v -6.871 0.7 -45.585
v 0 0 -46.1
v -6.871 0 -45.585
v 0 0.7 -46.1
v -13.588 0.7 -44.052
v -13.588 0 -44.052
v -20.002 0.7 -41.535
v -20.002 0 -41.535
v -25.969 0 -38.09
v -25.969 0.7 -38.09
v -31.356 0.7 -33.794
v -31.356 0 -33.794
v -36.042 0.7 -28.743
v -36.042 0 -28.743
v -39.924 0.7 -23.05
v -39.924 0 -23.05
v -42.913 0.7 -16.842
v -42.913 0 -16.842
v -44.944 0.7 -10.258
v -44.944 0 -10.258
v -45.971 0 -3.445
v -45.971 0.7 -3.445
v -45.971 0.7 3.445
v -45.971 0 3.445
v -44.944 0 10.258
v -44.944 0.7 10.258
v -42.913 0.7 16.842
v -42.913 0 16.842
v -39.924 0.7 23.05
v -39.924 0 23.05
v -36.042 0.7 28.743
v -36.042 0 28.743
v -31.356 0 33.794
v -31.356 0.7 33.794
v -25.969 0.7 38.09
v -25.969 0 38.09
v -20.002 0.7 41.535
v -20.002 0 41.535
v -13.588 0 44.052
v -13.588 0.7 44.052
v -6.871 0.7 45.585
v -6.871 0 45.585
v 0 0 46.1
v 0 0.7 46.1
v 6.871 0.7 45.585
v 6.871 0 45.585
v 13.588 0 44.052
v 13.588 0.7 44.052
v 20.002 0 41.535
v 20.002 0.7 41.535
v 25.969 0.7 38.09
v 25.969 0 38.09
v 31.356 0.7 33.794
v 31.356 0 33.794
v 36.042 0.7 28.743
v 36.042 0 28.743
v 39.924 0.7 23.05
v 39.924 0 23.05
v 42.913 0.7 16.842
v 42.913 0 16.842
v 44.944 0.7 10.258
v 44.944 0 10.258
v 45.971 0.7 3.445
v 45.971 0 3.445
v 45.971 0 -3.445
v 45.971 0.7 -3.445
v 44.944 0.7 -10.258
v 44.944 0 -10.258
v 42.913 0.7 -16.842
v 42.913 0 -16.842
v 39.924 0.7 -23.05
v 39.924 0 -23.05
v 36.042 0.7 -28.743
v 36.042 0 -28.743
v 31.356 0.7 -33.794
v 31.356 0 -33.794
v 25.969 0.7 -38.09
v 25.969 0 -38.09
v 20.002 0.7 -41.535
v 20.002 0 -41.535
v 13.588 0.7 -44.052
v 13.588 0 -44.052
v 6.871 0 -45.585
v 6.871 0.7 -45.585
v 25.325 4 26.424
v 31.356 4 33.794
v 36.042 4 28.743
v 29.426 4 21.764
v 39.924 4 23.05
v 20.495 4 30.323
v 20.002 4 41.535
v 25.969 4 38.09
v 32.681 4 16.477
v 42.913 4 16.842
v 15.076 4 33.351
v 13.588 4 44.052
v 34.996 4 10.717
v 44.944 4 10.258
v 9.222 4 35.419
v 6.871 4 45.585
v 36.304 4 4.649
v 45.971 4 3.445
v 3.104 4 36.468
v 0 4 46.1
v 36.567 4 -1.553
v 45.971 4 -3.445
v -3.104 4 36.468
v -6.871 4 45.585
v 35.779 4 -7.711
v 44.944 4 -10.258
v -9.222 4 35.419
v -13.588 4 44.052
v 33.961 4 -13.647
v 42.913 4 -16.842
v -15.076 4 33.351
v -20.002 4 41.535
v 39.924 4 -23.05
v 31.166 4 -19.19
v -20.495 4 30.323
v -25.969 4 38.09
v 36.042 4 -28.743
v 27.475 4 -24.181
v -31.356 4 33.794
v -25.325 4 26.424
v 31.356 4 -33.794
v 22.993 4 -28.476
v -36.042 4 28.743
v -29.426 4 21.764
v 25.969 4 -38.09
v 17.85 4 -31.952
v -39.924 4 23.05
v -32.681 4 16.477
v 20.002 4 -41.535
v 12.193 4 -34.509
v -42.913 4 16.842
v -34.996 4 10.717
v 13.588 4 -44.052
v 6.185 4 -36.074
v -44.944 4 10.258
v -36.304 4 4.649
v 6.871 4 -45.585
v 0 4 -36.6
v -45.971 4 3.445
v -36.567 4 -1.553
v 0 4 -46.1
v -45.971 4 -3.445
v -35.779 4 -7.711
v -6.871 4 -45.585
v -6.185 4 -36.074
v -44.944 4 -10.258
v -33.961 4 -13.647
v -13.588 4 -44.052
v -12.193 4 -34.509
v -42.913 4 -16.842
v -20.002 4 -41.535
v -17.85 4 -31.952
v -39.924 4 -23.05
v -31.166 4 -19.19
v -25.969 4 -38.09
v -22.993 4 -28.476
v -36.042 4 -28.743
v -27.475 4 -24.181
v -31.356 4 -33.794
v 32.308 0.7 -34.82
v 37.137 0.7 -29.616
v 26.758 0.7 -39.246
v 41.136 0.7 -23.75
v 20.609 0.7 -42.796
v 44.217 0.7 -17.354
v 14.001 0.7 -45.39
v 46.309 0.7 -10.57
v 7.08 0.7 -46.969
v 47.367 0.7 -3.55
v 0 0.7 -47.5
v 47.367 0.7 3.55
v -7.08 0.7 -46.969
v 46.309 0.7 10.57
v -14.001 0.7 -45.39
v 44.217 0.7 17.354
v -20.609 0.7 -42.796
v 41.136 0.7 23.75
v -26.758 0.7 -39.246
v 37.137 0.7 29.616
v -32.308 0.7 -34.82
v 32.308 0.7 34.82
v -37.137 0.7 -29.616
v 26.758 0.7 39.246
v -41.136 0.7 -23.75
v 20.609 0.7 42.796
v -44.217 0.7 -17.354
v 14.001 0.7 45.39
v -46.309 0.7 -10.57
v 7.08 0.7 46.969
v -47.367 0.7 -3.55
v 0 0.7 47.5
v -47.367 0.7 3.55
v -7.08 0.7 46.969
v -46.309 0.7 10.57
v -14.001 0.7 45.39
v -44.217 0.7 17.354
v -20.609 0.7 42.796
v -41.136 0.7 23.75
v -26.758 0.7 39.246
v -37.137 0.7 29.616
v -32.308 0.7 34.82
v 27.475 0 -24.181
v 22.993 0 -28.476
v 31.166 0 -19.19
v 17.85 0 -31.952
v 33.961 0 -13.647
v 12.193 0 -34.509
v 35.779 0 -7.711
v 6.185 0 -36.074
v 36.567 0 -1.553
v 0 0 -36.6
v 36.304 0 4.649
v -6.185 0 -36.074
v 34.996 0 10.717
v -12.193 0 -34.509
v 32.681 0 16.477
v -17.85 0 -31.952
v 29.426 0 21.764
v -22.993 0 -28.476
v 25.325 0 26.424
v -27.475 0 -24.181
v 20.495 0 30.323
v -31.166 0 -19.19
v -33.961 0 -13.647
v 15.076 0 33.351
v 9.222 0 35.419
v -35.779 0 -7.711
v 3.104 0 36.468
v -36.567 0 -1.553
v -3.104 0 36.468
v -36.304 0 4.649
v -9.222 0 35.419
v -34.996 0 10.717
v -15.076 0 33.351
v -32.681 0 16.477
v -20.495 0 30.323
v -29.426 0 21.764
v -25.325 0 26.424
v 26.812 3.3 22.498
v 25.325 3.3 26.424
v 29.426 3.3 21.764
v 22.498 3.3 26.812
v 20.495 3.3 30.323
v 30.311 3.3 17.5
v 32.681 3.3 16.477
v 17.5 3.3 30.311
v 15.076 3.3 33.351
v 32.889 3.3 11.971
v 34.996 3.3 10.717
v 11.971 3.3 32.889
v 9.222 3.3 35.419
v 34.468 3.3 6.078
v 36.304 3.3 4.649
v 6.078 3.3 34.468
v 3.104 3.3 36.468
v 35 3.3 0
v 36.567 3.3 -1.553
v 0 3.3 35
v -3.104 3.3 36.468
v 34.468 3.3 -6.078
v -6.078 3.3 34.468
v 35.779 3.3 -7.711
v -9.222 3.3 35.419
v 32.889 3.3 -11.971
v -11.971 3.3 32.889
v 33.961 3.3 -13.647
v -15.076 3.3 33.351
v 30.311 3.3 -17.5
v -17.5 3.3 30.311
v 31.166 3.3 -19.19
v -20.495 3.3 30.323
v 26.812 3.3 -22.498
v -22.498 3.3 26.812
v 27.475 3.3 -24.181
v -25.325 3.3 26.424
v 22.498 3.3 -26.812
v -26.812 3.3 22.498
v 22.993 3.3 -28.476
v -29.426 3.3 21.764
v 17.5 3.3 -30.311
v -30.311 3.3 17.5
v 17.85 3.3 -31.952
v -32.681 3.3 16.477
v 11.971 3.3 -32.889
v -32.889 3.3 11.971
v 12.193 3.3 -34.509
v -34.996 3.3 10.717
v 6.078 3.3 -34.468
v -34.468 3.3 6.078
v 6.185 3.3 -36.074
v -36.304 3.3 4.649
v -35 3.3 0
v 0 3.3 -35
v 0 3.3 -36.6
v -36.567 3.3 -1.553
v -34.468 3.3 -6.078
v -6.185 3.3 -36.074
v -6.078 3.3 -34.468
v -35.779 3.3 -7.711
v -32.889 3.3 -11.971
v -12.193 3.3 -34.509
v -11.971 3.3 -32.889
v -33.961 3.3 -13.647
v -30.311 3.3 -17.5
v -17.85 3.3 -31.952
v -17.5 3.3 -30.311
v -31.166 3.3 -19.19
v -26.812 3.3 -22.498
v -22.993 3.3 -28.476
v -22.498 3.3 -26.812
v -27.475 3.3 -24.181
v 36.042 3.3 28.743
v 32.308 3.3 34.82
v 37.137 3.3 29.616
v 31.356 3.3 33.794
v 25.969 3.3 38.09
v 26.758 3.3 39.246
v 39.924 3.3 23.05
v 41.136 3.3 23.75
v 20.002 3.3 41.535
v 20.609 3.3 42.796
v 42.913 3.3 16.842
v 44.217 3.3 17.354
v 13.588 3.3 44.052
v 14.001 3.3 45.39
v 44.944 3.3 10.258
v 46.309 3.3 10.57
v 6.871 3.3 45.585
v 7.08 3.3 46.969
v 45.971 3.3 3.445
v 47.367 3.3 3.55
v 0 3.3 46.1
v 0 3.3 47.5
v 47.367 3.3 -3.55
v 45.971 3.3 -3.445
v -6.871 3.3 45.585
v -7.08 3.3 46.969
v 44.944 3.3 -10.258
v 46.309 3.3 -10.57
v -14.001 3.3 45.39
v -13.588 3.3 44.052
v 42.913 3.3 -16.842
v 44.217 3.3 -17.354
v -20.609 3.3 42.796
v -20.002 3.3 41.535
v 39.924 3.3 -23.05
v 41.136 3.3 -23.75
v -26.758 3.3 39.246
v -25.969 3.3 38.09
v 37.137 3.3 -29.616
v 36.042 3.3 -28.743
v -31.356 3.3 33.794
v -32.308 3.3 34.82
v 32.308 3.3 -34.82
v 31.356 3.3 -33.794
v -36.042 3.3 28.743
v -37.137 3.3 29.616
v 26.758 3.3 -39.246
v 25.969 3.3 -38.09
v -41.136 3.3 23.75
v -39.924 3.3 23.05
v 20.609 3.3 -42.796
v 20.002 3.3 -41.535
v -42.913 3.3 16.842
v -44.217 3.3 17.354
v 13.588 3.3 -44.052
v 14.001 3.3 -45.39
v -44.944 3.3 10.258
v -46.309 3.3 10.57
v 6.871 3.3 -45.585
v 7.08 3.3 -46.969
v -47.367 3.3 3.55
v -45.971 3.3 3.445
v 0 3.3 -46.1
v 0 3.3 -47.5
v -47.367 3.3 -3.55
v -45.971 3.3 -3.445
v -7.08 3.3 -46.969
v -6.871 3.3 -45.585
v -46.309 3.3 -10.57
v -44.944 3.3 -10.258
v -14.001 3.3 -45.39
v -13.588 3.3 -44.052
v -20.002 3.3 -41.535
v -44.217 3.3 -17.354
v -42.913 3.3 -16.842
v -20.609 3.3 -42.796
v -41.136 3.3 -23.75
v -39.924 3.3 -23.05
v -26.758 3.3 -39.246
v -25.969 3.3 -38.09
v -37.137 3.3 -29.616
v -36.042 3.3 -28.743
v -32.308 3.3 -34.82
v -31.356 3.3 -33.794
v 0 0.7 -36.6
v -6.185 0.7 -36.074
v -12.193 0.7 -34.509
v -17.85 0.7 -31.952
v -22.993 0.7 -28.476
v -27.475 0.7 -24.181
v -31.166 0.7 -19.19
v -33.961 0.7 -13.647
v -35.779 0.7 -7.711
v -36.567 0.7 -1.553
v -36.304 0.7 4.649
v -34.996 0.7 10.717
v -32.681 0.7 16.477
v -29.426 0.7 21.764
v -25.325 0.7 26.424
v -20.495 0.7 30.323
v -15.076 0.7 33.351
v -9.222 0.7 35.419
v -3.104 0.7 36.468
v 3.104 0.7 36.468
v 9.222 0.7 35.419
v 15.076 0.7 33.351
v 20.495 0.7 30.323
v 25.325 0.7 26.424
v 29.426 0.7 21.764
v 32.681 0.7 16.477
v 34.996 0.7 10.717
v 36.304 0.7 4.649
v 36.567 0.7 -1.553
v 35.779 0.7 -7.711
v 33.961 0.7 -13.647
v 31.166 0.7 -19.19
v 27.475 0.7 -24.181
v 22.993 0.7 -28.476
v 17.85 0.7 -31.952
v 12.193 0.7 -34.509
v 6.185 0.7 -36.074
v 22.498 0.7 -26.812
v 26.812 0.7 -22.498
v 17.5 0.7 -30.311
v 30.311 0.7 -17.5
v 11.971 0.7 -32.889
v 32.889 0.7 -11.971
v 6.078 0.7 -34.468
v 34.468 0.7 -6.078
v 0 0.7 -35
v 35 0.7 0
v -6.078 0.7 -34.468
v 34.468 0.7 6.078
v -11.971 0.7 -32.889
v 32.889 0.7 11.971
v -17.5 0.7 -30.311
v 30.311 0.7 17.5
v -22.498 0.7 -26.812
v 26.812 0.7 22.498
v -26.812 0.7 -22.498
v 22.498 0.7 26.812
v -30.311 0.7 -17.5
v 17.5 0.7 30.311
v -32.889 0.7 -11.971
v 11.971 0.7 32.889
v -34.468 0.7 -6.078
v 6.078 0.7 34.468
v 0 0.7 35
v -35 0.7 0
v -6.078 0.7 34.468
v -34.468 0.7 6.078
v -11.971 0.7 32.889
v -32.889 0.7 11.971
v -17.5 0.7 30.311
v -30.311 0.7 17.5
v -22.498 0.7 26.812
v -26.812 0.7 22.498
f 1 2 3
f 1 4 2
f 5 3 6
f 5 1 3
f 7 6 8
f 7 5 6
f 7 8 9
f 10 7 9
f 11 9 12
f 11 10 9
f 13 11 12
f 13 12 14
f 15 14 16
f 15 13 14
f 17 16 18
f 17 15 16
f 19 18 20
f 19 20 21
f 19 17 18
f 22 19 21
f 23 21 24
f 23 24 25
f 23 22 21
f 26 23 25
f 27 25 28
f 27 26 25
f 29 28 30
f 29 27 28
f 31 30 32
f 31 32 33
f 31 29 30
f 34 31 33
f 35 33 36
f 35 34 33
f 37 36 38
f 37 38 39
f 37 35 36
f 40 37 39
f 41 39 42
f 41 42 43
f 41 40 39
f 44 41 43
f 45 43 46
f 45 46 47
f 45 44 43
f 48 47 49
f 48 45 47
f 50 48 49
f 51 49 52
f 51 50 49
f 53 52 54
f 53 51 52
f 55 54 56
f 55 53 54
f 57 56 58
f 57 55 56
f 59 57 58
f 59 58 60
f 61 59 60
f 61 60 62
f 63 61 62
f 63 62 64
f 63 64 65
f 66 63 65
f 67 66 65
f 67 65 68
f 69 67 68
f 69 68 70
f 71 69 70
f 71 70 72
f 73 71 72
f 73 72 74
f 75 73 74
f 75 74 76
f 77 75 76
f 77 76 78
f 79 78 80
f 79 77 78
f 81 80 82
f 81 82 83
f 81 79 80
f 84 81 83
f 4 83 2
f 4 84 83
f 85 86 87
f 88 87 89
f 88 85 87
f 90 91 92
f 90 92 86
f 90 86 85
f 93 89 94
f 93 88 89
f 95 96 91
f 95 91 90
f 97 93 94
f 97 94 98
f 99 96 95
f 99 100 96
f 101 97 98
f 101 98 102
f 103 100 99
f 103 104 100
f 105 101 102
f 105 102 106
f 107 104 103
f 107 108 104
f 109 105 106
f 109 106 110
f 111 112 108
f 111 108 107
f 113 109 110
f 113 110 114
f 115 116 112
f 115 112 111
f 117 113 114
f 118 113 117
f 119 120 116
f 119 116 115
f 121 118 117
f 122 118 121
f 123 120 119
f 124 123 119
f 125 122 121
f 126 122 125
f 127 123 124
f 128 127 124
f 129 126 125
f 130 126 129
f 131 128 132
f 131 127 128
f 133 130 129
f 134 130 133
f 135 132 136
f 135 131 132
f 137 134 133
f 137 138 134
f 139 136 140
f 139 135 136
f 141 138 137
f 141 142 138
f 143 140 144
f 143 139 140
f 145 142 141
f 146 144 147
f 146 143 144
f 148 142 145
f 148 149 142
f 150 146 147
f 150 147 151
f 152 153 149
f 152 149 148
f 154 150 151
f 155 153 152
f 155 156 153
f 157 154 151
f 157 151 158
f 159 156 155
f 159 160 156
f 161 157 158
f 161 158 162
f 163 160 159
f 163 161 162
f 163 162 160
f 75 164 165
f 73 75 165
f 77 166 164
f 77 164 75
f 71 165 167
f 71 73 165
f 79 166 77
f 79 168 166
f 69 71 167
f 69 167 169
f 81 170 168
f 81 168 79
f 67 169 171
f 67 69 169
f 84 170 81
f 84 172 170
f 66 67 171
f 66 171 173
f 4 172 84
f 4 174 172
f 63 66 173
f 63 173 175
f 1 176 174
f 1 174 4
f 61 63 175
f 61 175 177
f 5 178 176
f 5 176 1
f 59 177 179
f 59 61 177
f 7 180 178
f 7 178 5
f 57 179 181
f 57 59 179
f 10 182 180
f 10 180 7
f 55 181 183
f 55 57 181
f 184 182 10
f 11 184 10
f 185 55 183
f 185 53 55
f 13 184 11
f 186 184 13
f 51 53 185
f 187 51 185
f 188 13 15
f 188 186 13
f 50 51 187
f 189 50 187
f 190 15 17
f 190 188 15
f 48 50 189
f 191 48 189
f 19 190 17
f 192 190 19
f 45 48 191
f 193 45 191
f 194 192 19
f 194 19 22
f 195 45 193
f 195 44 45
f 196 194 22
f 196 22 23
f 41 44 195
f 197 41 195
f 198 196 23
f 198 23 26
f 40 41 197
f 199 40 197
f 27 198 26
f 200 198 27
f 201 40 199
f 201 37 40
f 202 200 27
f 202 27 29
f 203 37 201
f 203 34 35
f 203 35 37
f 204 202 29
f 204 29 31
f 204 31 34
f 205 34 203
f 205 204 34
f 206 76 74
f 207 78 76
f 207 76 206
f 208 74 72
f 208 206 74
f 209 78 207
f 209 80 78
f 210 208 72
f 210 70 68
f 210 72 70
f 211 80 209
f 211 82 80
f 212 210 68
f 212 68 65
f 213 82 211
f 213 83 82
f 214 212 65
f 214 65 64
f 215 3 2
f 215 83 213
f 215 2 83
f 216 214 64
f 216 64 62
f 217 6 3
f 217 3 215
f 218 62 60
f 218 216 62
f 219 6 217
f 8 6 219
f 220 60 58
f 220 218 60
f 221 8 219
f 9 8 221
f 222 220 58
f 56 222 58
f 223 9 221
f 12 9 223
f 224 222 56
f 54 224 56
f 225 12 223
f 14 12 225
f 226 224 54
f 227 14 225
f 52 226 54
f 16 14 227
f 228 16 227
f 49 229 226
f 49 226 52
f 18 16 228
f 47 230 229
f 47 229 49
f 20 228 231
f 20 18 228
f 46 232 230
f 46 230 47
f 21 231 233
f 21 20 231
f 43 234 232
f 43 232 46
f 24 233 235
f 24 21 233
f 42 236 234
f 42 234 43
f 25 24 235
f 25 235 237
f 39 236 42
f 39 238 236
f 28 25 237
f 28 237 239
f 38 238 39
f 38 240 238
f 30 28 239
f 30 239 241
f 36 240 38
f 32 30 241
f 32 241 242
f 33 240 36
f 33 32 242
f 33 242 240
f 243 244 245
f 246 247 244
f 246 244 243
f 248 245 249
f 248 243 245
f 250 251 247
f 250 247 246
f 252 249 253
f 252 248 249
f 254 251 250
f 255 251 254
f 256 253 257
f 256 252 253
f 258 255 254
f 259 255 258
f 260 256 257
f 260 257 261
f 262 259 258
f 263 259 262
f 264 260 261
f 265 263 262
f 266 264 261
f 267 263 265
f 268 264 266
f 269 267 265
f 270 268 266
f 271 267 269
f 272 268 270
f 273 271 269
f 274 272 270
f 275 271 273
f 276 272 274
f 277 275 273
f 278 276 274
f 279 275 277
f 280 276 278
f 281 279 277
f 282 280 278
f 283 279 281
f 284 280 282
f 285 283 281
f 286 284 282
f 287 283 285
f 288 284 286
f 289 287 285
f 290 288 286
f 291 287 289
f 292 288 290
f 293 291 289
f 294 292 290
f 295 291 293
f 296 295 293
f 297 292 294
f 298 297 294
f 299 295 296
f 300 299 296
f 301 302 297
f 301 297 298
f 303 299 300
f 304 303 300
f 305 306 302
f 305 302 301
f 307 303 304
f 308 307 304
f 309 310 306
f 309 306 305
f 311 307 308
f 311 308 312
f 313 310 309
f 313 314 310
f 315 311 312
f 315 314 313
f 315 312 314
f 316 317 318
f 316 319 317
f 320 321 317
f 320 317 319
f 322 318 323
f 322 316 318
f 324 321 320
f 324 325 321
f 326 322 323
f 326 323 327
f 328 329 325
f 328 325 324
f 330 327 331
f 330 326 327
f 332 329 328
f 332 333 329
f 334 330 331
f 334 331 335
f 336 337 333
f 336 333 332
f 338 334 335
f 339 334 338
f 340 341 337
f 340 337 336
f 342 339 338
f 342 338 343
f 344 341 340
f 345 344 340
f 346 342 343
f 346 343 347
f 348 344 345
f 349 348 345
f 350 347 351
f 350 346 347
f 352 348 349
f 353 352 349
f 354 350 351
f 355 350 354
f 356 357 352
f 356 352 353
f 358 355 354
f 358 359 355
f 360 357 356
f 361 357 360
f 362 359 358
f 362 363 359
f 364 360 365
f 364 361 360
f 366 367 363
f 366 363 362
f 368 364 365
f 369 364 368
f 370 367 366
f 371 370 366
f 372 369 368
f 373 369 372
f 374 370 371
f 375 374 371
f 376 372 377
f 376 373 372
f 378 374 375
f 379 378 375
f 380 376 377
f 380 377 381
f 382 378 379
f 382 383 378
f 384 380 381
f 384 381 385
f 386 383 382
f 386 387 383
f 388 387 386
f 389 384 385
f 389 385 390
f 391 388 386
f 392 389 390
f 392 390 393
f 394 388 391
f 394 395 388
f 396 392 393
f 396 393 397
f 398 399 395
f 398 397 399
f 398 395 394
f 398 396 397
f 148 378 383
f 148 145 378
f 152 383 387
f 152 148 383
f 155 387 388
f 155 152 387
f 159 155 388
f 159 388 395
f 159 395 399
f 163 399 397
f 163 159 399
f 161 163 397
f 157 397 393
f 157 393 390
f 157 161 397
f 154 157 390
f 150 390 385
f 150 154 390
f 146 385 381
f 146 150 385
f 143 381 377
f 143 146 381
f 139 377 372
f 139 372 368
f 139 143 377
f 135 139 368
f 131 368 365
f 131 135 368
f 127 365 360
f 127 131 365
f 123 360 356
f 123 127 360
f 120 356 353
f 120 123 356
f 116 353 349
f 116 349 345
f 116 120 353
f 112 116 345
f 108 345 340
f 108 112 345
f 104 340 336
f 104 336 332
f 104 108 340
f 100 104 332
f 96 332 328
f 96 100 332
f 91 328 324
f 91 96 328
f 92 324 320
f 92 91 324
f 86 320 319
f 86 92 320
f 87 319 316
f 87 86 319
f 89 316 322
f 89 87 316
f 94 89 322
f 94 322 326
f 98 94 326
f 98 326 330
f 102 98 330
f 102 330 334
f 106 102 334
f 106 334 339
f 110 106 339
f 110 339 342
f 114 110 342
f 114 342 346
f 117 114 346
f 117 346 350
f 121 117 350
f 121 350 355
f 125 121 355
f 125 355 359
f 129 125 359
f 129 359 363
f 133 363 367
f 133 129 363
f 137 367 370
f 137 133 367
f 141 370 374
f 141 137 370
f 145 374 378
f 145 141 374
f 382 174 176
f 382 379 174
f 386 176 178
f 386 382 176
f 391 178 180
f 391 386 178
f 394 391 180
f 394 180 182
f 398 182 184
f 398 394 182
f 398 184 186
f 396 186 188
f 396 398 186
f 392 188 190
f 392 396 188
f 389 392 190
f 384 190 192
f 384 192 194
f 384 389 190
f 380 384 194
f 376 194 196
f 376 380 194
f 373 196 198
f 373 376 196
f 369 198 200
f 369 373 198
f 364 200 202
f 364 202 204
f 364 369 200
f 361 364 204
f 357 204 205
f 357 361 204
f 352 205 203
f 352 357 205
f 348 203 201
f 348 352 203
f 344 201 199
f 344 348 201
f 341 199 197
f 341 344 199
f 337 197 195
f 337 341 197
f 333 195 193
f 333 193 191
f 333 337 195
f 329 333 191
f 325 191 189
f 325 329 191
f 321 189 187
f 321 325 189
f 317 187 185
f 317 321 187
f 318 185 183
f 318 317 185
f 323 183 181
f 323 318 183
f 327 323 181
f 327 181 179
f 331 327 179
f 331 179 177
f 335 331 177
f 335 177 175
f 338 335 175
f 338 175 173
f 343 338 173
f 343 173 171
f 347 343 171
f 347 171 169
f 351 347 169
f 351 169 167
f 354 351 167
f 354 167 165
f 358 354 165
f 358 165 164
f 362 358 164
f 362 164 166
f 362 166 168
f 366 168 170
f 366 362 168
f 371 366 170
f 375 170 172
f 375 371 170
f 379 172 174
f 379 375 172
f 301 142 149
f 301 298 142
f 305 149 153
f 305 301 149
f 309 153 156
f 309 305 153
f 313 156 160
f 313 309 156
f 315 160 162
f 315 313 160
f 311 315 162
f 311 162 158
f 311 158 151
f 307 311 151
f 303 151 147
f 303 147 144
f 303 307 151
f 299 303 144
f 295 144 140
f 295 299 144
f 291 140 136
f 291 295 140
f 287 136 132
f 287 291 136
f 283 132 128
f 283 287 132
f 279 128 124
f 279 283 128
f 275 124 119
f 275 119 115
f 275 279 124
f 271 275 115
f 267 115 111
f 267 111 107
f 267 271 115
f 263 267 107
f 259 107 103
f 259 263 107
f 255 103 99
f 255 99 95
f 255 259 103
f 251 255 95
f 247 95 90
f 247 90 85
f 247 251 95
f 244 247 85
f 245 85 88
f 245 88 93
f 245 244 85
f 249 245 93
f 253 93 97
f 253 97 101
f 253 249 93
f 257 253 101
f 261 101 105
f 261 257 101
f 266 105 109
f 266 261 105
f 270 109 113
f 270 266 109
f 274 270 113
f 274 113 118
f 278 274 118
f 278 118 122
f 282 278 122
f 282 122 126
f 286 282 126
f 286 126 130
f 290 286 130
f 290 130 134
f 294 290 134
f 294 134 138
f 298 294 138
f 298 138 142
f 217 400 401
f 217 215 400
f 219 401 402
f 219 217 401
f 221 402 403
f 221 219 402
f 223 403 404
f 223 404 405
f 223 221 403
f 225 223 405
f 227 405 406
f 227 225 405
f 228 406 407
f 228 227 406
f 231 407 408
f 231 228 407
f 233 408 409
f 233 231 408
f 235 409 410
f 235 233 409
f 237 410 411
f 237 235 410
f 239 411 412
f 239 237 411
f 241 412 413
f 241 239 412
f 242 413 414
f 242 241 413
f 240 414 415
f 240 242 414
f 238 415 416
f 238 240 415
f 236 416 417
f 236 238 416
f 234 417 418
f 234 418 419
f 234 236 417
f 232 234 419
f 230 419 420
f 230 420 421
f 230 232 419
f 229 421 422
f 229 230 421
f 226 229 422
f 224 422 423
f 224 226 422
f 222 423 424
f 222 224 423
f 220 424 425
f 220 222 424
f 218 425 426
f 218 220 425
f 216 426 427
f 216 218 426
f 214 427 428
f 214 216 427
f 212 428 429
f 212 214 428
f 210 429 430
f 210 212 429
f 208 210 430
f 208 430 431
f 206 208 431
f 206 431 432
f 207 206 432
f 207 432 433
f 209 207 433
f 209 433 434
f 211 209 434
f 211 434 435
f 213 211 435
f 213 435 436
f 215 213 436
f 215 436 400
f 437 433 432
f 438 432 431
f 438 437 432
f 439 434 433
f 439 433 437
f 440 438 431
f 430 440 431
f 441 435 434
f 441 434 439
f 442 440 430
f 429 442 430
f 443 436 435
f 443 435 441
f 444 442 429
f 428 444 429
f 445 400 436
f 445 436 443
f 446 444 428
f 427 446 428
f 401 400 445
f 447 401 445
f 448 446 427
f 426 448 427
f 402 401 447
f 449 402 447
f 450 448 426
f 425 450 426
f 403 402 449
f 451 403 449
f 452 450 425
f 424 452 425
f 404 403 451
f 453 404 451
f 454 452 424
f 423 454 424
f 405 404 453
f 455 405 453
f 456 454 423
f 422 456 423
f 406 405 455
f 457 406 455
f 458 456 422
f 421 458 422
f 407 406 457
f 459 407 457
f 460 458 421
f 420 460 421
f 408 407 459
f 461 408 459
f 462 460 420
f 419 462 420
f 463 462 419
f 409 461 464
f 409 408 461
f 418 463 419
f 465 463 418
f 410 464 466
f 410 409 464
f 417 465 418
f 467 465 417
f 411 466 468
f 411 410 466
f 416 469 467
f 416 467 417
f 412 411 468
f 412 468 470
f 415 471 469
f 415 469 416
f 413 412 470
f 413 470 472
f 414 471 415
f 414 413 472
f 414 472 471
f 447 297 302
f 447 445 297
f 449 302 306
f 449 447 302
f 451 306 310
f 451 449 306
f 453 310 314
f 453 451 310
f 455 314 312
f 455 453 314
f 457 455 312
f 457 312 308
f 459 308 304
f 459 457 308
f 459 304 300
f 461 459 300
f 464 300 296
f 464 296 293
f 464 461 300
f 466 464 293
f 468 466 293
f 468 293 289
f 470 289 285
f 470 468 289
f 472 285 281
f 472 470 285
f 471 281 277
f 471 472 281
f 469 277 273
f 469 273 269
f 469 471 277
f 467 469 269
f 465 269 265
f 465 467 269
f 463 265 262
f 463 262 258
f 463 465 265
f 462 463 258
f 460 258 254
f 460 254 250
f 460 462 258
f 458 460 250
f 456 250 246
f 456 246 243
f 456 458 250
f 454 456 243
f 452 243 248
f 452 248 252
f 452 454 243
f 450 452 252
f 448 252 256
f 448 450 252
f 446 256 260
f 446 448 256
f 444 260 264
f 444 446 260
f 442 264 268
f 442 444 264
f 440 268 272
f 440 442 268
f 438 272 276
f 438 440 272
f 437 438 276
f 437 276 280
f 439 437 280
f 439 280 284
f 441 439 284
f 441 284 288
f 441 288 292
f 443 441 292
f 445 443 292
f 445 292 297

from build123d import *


with BuildPart() as part:
    # Skizze1 → Rotation1 (revolve)
    with BuildSketch(Plane.XY, mode=Mode.PRIVATE) as rotation1_sk:
        Polygon((36.6, 0), (46.1, 0), (46.1, 0.7), (47.5, 0.7), (47.5, 3.3), (46.1, 3.3), (46.1, 4), (36.6, 4), (36.6, 3.3), (35, 3.3), (35, 0.7), (36.6, 0.7), align=None)
    revolve(rotation1_sk.sketch.rotate(Axis((0, 0, 0), (0, 1, 0)), 90), axis=Axis((0, 0, 0), (0, 1, 0)))


solid = part.part
